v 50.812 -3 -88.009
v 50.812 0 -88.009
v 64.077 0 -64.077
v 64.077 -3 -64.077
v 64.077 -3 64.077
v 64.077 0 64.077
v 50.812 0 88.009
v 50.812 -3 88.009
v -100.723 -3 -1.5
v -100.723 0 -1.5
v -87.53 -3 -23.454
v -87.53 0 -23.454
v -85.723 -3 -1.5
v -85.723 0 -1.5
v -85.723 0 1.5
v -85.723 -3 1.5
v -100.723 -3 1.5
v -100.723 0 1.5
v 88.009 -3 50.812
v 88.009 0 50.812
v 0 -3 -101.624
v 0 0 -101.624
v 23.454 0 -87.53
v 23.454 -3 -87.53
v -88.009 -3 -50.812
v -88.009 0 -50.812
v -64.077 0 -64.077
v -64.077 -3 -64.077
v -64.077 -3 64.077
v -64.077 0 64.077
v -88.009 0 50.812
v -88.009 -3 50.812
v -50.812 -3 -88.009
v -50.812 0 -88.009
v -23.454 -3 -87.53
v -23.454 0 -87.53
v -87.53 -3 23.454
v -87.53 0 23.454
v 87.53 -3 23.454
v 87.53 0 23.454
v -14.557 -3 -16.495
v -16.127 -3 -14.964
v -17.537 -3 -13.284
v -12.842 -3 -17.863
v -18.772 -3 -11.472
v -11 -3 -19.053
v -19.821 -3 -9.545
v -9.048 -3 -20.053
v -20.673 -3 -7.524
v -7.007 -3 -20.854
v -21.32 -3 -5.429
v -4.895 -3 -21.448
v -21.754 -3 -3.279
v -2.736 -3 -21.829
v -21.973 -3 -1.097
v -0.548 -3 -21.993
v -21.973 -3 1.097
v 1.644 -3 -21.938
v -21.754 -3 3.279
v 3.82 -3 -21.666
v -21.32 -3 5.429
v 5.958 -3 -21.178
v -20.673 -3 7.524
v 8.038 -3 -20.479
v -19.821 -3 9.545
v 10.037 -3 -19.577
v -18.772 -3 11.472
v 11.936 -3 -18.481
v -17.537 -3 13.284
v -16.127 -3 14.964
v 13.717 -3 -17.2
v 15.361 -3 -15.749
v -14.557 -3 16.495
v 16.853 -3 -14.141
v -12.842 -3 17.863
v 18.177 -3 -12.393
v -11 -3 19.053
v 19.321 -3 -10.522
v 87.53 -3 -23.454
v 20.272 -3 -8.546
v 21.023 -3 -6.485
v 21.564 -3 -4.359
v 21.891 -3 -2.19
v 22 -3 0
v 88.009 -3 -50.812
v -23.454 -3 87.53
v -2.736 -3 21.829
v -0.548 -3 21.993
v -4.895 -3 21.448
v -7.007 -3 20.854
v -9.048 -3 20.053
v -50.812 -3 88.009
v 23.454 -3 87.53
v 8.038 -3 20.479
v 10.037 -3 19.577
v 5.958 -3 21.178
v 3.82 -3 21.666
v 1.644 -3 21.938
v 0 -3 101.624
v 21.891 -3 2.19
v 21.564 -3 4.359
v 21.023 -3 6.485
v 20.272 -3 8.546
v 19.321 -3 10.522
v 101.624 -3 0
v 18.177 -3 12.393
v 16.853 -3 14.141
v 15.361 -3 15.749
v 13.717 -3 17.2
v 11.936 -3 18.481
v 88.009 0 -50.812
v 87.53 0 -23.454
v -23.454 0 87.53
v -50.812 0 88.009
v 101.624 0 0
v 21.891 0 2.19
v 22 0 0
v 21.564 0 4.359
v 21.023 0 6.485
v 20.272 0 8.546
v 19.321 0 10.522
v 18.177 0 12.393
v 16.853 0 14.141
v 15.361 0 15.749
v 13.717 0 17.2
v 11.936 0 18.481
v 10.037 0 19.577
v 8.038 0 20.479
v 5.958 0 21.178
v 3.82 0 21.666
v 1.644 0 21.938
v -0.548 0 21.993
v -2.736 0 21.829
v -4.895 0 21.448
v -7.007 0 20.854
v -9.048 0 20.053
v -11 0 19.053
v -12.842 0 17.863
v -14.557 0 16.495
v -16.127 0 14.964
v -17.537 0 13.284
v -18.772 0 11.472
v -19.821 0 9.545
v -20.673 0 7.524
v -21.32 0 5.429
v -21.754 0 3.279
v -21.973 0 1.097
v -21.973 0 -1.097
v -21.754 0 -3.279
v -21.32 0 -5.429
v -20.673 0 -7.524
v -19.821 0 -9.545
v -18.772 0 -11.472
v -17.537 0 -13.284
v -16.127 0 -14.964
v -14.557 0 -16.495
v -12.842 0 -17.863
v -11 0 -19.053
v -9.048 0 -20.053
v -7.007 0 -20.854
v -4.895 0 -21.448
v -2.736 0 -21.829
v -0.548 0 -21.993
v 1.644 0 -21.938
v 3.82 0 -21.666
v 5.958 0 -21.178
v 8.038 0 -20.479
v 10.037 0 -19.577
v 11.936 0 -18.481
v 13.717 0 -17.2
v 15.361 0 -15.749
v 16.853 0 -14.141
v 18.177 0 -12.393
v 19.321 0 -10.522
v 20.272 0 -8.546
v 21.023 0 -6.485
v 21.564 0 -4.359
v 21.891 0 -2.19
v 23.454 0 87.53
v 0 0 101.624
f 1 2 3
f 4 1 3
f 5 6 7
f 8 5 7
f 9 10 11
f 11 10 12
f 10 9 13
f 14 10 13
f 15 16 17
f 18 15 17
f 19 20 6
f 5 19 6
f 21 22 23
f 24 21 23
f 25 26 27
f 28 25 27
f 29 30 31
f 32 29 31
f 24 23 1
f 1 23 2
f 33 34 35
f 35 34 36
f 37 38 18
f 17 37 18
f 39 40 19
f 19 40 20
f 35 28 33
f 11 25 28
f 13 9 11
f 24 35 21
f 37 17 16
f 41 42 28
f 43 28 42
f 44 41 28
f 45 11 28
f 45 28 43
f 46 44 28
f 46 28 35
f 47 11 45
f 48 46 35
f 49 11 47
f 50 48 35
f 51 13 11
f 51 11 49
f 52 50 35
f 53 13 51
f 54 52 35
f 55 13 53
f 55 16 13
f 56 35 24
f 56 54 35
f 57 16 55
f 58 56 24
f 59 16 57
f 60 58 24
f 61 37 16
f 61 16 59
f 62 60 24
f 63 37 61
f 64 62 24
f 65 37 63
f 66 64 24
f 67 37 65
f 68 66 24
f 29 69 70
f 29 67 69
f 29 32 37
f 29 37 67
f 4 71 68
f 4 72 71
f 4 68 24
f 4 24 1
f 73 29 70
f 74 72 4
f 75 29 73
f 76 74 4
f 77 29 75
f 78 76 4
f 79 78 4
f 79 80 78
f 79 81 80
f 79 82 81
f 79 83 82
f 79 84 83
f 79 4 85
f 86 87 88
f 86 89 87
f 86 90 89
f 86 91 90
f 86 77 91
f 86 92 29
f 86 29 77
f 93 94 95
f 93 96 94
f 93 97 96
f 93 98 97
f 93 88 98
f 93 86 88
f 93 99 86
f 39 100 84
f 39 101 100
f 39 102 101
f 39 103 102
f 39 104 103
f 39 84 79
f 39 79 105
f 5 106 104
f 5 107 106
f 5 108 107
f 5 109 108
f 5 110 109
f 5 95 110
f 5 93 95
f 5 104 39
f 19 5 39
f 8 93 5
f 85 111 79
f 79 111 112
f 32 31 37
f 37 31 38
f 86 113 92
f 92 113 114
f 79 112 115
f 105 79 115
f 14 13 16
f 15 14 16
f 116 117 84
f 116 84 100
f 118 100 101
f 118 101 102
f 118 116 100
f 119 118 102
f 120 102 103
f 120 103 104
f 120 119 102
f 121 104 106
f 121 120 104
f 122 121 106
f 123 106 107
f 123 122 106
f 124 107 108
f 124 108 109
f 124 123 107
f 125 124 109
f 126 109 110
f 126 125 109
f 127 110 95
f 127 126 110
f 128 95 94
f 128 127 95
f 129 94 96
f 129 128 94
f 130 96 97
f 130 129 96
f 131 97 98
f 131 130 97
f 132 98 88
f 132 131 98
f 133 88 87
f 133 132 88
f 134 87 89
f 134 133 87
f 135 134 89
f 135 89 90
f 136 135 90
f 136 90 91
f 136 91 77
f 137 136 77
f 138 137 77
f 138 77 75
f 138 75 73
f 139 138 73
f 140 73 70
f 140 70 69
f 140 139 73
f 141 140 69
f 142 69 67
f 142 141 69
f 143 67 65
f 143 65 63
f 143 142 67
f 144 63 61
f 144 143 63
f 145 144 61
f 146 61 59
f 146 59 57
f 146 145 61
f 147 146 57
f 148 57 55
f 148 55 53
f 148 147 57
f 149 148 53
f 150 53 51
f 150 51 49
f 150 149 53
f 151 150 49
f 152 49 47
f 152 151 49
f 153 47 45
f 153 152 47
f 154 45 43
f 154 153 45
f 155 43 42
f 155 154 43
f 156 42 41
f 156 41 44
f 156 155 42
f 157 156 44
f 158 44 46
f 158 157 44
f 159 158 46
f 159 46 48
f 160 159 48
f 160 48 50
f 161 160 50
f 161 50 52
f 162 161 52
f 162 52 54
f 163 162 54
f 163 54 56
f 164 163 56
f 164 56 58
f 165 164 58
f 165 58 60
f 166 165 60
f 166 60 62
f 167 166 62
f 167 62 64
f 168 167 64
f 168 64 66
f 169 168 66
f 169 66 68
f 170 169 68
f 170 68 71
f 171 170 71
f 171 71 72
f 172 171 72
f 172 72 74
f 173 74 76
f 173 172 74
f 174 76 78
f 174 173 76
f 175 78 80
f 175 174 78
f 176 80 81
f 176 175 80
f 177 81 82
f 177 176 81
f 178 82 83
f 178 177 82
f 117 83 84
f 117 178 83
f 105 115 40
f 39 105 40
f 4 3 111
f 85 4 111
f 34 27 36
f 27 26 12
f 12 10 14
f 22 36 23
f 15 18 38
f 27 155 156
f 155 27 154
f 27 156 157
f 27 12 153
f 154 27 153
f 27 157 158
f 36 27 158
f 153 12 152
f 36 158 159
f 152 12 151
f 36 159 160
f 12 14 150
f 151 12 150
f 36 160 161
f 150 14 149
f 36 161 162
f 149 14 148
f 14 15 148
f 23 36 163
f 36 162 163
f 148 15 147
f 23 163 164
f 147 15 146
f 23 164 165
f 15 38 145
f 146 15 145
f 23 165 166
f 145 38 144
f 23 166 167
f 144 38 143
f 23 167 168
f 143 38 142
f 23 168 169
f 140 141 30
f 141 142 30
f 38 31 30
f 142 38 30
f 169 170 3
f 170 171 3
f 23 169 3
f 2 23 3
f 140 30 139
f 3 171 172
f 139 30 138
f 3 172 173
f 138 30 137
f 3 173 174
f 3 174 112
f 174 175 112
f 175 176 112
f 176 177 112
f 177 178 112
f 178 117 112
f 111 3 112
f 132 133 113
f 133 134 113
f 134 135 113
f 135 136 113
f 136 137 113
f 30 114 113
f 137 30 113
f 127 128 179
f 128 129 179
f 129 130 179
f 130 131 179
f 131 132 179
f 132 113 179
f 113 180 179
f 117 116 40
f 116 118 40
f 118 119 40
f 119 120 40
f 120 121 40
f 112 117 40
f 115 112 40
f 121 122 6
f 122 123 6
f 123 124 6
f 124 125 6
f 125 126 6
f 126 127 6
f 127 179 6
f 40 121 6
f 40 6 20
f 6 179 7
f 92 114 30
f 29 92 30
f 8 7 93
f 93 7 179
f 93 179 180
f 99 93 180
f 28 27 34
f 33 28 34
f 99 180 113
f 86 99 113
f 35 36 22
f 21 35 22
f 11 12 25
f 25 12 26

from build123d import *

# Parameters (mm, degrees)
F0_R     = 22
F1_DEPTH = 3
F2_DEPTH = 3
F4_DEPTH = 25


with BuildPart() as f1:
    # F0 (on Front) → F1 (new body)
    with BuildSketch(Plane.XZ):
        Polygon((0, 101.624342229), (-23.4537052032, 87.530419444), (-50.8121711145, 88.0092620132), (-64.0767142408, 64.0767142408), (-88.0092620132, 50.8121711145), (-87.530419444, 23.4537052032), (-101.624342229, 0), (-87.530419444, -23.4537052032), (-88.0092620132, -50.8121711145), (-64.0767142408, -64.0767142409), (-50.8121711145, -88.0092620132), (-23.4537052032, -87.530419444), (0, -101.624342229), (23.4537052032, -87.530419444), (50.8121711145, -88.0092620132), (64.0767142409, -64.0767142408), (88.0092620132, -50.8121711145), (87.530419444, -23.4537052032), (101.624342229, 0), (87.530419444, 23.4537052032), (88.0092620132, 50.8121711145), (64.0767142408, 64.0767142408), (50.8121711145, 88.0092620132), (23.4537052032, 87.530419444), align=None)
        Circle(F0_R, mode=Mode.SUBTRACT)
    extrude(amount=F1_DEPTH)

    # F0 (on Front) → F2 (join)
    with BuildSketch(Plane.XZ):
        Polygon((0, 101.624342229), (-23.4537052032, 87.530419444), (-50.8121711145, 88.0092620132), (-64.0767142408, 64.0767142408), (-88.0092620132, 50.8121711145), (-87.530419444, 23.4537052032), (-101.624342229, 0), (-87.530419444, -23.4537052032), (-88.0092620132, -50.8121711145), (-64.0767142408, -64.0767142409), (-50.8121711145, -88.0092620132), (-23.4537052032, -87.530419444), (0, -101.624342229), (23.4537052032, -87.530419444), (50.8121711145, -88.0092620132), (64.0767142409, -64.0767142408), (88.0092620132, -50.8121711145), (87.530419444, -23.4537052032), (101.624342229, 0), (87.530419444, 23.4537052032), (88.0092620132, 50.8121711145), (64.0767142408, 64.0767142408), (50.8121711145, 88.0092620132), (23.4537052032, 87.530419444), align=None)
        Circle(F0_R, mode=Mode.SUBTRACT)
    extrude(amount=F2_DEPTH)

    # F3 (on face) → F4 (cut)
    with BuildSketch(Plane.XZ.offset(3)):
        Polygon((-85.7229544101, -1.5), (-85.7229544101, 1.5), (-100.7229544101, 1.5), (-100.7229544101, 14.0027841553), (-117.494545877, 14.0027841553), (-117.494545877, -1.5), (-100.7229544101, -1.5), align=None)
    extrude(amount=-F4_DEPTH, mode=Mode.SUBTRACT)


solid = f1.part
